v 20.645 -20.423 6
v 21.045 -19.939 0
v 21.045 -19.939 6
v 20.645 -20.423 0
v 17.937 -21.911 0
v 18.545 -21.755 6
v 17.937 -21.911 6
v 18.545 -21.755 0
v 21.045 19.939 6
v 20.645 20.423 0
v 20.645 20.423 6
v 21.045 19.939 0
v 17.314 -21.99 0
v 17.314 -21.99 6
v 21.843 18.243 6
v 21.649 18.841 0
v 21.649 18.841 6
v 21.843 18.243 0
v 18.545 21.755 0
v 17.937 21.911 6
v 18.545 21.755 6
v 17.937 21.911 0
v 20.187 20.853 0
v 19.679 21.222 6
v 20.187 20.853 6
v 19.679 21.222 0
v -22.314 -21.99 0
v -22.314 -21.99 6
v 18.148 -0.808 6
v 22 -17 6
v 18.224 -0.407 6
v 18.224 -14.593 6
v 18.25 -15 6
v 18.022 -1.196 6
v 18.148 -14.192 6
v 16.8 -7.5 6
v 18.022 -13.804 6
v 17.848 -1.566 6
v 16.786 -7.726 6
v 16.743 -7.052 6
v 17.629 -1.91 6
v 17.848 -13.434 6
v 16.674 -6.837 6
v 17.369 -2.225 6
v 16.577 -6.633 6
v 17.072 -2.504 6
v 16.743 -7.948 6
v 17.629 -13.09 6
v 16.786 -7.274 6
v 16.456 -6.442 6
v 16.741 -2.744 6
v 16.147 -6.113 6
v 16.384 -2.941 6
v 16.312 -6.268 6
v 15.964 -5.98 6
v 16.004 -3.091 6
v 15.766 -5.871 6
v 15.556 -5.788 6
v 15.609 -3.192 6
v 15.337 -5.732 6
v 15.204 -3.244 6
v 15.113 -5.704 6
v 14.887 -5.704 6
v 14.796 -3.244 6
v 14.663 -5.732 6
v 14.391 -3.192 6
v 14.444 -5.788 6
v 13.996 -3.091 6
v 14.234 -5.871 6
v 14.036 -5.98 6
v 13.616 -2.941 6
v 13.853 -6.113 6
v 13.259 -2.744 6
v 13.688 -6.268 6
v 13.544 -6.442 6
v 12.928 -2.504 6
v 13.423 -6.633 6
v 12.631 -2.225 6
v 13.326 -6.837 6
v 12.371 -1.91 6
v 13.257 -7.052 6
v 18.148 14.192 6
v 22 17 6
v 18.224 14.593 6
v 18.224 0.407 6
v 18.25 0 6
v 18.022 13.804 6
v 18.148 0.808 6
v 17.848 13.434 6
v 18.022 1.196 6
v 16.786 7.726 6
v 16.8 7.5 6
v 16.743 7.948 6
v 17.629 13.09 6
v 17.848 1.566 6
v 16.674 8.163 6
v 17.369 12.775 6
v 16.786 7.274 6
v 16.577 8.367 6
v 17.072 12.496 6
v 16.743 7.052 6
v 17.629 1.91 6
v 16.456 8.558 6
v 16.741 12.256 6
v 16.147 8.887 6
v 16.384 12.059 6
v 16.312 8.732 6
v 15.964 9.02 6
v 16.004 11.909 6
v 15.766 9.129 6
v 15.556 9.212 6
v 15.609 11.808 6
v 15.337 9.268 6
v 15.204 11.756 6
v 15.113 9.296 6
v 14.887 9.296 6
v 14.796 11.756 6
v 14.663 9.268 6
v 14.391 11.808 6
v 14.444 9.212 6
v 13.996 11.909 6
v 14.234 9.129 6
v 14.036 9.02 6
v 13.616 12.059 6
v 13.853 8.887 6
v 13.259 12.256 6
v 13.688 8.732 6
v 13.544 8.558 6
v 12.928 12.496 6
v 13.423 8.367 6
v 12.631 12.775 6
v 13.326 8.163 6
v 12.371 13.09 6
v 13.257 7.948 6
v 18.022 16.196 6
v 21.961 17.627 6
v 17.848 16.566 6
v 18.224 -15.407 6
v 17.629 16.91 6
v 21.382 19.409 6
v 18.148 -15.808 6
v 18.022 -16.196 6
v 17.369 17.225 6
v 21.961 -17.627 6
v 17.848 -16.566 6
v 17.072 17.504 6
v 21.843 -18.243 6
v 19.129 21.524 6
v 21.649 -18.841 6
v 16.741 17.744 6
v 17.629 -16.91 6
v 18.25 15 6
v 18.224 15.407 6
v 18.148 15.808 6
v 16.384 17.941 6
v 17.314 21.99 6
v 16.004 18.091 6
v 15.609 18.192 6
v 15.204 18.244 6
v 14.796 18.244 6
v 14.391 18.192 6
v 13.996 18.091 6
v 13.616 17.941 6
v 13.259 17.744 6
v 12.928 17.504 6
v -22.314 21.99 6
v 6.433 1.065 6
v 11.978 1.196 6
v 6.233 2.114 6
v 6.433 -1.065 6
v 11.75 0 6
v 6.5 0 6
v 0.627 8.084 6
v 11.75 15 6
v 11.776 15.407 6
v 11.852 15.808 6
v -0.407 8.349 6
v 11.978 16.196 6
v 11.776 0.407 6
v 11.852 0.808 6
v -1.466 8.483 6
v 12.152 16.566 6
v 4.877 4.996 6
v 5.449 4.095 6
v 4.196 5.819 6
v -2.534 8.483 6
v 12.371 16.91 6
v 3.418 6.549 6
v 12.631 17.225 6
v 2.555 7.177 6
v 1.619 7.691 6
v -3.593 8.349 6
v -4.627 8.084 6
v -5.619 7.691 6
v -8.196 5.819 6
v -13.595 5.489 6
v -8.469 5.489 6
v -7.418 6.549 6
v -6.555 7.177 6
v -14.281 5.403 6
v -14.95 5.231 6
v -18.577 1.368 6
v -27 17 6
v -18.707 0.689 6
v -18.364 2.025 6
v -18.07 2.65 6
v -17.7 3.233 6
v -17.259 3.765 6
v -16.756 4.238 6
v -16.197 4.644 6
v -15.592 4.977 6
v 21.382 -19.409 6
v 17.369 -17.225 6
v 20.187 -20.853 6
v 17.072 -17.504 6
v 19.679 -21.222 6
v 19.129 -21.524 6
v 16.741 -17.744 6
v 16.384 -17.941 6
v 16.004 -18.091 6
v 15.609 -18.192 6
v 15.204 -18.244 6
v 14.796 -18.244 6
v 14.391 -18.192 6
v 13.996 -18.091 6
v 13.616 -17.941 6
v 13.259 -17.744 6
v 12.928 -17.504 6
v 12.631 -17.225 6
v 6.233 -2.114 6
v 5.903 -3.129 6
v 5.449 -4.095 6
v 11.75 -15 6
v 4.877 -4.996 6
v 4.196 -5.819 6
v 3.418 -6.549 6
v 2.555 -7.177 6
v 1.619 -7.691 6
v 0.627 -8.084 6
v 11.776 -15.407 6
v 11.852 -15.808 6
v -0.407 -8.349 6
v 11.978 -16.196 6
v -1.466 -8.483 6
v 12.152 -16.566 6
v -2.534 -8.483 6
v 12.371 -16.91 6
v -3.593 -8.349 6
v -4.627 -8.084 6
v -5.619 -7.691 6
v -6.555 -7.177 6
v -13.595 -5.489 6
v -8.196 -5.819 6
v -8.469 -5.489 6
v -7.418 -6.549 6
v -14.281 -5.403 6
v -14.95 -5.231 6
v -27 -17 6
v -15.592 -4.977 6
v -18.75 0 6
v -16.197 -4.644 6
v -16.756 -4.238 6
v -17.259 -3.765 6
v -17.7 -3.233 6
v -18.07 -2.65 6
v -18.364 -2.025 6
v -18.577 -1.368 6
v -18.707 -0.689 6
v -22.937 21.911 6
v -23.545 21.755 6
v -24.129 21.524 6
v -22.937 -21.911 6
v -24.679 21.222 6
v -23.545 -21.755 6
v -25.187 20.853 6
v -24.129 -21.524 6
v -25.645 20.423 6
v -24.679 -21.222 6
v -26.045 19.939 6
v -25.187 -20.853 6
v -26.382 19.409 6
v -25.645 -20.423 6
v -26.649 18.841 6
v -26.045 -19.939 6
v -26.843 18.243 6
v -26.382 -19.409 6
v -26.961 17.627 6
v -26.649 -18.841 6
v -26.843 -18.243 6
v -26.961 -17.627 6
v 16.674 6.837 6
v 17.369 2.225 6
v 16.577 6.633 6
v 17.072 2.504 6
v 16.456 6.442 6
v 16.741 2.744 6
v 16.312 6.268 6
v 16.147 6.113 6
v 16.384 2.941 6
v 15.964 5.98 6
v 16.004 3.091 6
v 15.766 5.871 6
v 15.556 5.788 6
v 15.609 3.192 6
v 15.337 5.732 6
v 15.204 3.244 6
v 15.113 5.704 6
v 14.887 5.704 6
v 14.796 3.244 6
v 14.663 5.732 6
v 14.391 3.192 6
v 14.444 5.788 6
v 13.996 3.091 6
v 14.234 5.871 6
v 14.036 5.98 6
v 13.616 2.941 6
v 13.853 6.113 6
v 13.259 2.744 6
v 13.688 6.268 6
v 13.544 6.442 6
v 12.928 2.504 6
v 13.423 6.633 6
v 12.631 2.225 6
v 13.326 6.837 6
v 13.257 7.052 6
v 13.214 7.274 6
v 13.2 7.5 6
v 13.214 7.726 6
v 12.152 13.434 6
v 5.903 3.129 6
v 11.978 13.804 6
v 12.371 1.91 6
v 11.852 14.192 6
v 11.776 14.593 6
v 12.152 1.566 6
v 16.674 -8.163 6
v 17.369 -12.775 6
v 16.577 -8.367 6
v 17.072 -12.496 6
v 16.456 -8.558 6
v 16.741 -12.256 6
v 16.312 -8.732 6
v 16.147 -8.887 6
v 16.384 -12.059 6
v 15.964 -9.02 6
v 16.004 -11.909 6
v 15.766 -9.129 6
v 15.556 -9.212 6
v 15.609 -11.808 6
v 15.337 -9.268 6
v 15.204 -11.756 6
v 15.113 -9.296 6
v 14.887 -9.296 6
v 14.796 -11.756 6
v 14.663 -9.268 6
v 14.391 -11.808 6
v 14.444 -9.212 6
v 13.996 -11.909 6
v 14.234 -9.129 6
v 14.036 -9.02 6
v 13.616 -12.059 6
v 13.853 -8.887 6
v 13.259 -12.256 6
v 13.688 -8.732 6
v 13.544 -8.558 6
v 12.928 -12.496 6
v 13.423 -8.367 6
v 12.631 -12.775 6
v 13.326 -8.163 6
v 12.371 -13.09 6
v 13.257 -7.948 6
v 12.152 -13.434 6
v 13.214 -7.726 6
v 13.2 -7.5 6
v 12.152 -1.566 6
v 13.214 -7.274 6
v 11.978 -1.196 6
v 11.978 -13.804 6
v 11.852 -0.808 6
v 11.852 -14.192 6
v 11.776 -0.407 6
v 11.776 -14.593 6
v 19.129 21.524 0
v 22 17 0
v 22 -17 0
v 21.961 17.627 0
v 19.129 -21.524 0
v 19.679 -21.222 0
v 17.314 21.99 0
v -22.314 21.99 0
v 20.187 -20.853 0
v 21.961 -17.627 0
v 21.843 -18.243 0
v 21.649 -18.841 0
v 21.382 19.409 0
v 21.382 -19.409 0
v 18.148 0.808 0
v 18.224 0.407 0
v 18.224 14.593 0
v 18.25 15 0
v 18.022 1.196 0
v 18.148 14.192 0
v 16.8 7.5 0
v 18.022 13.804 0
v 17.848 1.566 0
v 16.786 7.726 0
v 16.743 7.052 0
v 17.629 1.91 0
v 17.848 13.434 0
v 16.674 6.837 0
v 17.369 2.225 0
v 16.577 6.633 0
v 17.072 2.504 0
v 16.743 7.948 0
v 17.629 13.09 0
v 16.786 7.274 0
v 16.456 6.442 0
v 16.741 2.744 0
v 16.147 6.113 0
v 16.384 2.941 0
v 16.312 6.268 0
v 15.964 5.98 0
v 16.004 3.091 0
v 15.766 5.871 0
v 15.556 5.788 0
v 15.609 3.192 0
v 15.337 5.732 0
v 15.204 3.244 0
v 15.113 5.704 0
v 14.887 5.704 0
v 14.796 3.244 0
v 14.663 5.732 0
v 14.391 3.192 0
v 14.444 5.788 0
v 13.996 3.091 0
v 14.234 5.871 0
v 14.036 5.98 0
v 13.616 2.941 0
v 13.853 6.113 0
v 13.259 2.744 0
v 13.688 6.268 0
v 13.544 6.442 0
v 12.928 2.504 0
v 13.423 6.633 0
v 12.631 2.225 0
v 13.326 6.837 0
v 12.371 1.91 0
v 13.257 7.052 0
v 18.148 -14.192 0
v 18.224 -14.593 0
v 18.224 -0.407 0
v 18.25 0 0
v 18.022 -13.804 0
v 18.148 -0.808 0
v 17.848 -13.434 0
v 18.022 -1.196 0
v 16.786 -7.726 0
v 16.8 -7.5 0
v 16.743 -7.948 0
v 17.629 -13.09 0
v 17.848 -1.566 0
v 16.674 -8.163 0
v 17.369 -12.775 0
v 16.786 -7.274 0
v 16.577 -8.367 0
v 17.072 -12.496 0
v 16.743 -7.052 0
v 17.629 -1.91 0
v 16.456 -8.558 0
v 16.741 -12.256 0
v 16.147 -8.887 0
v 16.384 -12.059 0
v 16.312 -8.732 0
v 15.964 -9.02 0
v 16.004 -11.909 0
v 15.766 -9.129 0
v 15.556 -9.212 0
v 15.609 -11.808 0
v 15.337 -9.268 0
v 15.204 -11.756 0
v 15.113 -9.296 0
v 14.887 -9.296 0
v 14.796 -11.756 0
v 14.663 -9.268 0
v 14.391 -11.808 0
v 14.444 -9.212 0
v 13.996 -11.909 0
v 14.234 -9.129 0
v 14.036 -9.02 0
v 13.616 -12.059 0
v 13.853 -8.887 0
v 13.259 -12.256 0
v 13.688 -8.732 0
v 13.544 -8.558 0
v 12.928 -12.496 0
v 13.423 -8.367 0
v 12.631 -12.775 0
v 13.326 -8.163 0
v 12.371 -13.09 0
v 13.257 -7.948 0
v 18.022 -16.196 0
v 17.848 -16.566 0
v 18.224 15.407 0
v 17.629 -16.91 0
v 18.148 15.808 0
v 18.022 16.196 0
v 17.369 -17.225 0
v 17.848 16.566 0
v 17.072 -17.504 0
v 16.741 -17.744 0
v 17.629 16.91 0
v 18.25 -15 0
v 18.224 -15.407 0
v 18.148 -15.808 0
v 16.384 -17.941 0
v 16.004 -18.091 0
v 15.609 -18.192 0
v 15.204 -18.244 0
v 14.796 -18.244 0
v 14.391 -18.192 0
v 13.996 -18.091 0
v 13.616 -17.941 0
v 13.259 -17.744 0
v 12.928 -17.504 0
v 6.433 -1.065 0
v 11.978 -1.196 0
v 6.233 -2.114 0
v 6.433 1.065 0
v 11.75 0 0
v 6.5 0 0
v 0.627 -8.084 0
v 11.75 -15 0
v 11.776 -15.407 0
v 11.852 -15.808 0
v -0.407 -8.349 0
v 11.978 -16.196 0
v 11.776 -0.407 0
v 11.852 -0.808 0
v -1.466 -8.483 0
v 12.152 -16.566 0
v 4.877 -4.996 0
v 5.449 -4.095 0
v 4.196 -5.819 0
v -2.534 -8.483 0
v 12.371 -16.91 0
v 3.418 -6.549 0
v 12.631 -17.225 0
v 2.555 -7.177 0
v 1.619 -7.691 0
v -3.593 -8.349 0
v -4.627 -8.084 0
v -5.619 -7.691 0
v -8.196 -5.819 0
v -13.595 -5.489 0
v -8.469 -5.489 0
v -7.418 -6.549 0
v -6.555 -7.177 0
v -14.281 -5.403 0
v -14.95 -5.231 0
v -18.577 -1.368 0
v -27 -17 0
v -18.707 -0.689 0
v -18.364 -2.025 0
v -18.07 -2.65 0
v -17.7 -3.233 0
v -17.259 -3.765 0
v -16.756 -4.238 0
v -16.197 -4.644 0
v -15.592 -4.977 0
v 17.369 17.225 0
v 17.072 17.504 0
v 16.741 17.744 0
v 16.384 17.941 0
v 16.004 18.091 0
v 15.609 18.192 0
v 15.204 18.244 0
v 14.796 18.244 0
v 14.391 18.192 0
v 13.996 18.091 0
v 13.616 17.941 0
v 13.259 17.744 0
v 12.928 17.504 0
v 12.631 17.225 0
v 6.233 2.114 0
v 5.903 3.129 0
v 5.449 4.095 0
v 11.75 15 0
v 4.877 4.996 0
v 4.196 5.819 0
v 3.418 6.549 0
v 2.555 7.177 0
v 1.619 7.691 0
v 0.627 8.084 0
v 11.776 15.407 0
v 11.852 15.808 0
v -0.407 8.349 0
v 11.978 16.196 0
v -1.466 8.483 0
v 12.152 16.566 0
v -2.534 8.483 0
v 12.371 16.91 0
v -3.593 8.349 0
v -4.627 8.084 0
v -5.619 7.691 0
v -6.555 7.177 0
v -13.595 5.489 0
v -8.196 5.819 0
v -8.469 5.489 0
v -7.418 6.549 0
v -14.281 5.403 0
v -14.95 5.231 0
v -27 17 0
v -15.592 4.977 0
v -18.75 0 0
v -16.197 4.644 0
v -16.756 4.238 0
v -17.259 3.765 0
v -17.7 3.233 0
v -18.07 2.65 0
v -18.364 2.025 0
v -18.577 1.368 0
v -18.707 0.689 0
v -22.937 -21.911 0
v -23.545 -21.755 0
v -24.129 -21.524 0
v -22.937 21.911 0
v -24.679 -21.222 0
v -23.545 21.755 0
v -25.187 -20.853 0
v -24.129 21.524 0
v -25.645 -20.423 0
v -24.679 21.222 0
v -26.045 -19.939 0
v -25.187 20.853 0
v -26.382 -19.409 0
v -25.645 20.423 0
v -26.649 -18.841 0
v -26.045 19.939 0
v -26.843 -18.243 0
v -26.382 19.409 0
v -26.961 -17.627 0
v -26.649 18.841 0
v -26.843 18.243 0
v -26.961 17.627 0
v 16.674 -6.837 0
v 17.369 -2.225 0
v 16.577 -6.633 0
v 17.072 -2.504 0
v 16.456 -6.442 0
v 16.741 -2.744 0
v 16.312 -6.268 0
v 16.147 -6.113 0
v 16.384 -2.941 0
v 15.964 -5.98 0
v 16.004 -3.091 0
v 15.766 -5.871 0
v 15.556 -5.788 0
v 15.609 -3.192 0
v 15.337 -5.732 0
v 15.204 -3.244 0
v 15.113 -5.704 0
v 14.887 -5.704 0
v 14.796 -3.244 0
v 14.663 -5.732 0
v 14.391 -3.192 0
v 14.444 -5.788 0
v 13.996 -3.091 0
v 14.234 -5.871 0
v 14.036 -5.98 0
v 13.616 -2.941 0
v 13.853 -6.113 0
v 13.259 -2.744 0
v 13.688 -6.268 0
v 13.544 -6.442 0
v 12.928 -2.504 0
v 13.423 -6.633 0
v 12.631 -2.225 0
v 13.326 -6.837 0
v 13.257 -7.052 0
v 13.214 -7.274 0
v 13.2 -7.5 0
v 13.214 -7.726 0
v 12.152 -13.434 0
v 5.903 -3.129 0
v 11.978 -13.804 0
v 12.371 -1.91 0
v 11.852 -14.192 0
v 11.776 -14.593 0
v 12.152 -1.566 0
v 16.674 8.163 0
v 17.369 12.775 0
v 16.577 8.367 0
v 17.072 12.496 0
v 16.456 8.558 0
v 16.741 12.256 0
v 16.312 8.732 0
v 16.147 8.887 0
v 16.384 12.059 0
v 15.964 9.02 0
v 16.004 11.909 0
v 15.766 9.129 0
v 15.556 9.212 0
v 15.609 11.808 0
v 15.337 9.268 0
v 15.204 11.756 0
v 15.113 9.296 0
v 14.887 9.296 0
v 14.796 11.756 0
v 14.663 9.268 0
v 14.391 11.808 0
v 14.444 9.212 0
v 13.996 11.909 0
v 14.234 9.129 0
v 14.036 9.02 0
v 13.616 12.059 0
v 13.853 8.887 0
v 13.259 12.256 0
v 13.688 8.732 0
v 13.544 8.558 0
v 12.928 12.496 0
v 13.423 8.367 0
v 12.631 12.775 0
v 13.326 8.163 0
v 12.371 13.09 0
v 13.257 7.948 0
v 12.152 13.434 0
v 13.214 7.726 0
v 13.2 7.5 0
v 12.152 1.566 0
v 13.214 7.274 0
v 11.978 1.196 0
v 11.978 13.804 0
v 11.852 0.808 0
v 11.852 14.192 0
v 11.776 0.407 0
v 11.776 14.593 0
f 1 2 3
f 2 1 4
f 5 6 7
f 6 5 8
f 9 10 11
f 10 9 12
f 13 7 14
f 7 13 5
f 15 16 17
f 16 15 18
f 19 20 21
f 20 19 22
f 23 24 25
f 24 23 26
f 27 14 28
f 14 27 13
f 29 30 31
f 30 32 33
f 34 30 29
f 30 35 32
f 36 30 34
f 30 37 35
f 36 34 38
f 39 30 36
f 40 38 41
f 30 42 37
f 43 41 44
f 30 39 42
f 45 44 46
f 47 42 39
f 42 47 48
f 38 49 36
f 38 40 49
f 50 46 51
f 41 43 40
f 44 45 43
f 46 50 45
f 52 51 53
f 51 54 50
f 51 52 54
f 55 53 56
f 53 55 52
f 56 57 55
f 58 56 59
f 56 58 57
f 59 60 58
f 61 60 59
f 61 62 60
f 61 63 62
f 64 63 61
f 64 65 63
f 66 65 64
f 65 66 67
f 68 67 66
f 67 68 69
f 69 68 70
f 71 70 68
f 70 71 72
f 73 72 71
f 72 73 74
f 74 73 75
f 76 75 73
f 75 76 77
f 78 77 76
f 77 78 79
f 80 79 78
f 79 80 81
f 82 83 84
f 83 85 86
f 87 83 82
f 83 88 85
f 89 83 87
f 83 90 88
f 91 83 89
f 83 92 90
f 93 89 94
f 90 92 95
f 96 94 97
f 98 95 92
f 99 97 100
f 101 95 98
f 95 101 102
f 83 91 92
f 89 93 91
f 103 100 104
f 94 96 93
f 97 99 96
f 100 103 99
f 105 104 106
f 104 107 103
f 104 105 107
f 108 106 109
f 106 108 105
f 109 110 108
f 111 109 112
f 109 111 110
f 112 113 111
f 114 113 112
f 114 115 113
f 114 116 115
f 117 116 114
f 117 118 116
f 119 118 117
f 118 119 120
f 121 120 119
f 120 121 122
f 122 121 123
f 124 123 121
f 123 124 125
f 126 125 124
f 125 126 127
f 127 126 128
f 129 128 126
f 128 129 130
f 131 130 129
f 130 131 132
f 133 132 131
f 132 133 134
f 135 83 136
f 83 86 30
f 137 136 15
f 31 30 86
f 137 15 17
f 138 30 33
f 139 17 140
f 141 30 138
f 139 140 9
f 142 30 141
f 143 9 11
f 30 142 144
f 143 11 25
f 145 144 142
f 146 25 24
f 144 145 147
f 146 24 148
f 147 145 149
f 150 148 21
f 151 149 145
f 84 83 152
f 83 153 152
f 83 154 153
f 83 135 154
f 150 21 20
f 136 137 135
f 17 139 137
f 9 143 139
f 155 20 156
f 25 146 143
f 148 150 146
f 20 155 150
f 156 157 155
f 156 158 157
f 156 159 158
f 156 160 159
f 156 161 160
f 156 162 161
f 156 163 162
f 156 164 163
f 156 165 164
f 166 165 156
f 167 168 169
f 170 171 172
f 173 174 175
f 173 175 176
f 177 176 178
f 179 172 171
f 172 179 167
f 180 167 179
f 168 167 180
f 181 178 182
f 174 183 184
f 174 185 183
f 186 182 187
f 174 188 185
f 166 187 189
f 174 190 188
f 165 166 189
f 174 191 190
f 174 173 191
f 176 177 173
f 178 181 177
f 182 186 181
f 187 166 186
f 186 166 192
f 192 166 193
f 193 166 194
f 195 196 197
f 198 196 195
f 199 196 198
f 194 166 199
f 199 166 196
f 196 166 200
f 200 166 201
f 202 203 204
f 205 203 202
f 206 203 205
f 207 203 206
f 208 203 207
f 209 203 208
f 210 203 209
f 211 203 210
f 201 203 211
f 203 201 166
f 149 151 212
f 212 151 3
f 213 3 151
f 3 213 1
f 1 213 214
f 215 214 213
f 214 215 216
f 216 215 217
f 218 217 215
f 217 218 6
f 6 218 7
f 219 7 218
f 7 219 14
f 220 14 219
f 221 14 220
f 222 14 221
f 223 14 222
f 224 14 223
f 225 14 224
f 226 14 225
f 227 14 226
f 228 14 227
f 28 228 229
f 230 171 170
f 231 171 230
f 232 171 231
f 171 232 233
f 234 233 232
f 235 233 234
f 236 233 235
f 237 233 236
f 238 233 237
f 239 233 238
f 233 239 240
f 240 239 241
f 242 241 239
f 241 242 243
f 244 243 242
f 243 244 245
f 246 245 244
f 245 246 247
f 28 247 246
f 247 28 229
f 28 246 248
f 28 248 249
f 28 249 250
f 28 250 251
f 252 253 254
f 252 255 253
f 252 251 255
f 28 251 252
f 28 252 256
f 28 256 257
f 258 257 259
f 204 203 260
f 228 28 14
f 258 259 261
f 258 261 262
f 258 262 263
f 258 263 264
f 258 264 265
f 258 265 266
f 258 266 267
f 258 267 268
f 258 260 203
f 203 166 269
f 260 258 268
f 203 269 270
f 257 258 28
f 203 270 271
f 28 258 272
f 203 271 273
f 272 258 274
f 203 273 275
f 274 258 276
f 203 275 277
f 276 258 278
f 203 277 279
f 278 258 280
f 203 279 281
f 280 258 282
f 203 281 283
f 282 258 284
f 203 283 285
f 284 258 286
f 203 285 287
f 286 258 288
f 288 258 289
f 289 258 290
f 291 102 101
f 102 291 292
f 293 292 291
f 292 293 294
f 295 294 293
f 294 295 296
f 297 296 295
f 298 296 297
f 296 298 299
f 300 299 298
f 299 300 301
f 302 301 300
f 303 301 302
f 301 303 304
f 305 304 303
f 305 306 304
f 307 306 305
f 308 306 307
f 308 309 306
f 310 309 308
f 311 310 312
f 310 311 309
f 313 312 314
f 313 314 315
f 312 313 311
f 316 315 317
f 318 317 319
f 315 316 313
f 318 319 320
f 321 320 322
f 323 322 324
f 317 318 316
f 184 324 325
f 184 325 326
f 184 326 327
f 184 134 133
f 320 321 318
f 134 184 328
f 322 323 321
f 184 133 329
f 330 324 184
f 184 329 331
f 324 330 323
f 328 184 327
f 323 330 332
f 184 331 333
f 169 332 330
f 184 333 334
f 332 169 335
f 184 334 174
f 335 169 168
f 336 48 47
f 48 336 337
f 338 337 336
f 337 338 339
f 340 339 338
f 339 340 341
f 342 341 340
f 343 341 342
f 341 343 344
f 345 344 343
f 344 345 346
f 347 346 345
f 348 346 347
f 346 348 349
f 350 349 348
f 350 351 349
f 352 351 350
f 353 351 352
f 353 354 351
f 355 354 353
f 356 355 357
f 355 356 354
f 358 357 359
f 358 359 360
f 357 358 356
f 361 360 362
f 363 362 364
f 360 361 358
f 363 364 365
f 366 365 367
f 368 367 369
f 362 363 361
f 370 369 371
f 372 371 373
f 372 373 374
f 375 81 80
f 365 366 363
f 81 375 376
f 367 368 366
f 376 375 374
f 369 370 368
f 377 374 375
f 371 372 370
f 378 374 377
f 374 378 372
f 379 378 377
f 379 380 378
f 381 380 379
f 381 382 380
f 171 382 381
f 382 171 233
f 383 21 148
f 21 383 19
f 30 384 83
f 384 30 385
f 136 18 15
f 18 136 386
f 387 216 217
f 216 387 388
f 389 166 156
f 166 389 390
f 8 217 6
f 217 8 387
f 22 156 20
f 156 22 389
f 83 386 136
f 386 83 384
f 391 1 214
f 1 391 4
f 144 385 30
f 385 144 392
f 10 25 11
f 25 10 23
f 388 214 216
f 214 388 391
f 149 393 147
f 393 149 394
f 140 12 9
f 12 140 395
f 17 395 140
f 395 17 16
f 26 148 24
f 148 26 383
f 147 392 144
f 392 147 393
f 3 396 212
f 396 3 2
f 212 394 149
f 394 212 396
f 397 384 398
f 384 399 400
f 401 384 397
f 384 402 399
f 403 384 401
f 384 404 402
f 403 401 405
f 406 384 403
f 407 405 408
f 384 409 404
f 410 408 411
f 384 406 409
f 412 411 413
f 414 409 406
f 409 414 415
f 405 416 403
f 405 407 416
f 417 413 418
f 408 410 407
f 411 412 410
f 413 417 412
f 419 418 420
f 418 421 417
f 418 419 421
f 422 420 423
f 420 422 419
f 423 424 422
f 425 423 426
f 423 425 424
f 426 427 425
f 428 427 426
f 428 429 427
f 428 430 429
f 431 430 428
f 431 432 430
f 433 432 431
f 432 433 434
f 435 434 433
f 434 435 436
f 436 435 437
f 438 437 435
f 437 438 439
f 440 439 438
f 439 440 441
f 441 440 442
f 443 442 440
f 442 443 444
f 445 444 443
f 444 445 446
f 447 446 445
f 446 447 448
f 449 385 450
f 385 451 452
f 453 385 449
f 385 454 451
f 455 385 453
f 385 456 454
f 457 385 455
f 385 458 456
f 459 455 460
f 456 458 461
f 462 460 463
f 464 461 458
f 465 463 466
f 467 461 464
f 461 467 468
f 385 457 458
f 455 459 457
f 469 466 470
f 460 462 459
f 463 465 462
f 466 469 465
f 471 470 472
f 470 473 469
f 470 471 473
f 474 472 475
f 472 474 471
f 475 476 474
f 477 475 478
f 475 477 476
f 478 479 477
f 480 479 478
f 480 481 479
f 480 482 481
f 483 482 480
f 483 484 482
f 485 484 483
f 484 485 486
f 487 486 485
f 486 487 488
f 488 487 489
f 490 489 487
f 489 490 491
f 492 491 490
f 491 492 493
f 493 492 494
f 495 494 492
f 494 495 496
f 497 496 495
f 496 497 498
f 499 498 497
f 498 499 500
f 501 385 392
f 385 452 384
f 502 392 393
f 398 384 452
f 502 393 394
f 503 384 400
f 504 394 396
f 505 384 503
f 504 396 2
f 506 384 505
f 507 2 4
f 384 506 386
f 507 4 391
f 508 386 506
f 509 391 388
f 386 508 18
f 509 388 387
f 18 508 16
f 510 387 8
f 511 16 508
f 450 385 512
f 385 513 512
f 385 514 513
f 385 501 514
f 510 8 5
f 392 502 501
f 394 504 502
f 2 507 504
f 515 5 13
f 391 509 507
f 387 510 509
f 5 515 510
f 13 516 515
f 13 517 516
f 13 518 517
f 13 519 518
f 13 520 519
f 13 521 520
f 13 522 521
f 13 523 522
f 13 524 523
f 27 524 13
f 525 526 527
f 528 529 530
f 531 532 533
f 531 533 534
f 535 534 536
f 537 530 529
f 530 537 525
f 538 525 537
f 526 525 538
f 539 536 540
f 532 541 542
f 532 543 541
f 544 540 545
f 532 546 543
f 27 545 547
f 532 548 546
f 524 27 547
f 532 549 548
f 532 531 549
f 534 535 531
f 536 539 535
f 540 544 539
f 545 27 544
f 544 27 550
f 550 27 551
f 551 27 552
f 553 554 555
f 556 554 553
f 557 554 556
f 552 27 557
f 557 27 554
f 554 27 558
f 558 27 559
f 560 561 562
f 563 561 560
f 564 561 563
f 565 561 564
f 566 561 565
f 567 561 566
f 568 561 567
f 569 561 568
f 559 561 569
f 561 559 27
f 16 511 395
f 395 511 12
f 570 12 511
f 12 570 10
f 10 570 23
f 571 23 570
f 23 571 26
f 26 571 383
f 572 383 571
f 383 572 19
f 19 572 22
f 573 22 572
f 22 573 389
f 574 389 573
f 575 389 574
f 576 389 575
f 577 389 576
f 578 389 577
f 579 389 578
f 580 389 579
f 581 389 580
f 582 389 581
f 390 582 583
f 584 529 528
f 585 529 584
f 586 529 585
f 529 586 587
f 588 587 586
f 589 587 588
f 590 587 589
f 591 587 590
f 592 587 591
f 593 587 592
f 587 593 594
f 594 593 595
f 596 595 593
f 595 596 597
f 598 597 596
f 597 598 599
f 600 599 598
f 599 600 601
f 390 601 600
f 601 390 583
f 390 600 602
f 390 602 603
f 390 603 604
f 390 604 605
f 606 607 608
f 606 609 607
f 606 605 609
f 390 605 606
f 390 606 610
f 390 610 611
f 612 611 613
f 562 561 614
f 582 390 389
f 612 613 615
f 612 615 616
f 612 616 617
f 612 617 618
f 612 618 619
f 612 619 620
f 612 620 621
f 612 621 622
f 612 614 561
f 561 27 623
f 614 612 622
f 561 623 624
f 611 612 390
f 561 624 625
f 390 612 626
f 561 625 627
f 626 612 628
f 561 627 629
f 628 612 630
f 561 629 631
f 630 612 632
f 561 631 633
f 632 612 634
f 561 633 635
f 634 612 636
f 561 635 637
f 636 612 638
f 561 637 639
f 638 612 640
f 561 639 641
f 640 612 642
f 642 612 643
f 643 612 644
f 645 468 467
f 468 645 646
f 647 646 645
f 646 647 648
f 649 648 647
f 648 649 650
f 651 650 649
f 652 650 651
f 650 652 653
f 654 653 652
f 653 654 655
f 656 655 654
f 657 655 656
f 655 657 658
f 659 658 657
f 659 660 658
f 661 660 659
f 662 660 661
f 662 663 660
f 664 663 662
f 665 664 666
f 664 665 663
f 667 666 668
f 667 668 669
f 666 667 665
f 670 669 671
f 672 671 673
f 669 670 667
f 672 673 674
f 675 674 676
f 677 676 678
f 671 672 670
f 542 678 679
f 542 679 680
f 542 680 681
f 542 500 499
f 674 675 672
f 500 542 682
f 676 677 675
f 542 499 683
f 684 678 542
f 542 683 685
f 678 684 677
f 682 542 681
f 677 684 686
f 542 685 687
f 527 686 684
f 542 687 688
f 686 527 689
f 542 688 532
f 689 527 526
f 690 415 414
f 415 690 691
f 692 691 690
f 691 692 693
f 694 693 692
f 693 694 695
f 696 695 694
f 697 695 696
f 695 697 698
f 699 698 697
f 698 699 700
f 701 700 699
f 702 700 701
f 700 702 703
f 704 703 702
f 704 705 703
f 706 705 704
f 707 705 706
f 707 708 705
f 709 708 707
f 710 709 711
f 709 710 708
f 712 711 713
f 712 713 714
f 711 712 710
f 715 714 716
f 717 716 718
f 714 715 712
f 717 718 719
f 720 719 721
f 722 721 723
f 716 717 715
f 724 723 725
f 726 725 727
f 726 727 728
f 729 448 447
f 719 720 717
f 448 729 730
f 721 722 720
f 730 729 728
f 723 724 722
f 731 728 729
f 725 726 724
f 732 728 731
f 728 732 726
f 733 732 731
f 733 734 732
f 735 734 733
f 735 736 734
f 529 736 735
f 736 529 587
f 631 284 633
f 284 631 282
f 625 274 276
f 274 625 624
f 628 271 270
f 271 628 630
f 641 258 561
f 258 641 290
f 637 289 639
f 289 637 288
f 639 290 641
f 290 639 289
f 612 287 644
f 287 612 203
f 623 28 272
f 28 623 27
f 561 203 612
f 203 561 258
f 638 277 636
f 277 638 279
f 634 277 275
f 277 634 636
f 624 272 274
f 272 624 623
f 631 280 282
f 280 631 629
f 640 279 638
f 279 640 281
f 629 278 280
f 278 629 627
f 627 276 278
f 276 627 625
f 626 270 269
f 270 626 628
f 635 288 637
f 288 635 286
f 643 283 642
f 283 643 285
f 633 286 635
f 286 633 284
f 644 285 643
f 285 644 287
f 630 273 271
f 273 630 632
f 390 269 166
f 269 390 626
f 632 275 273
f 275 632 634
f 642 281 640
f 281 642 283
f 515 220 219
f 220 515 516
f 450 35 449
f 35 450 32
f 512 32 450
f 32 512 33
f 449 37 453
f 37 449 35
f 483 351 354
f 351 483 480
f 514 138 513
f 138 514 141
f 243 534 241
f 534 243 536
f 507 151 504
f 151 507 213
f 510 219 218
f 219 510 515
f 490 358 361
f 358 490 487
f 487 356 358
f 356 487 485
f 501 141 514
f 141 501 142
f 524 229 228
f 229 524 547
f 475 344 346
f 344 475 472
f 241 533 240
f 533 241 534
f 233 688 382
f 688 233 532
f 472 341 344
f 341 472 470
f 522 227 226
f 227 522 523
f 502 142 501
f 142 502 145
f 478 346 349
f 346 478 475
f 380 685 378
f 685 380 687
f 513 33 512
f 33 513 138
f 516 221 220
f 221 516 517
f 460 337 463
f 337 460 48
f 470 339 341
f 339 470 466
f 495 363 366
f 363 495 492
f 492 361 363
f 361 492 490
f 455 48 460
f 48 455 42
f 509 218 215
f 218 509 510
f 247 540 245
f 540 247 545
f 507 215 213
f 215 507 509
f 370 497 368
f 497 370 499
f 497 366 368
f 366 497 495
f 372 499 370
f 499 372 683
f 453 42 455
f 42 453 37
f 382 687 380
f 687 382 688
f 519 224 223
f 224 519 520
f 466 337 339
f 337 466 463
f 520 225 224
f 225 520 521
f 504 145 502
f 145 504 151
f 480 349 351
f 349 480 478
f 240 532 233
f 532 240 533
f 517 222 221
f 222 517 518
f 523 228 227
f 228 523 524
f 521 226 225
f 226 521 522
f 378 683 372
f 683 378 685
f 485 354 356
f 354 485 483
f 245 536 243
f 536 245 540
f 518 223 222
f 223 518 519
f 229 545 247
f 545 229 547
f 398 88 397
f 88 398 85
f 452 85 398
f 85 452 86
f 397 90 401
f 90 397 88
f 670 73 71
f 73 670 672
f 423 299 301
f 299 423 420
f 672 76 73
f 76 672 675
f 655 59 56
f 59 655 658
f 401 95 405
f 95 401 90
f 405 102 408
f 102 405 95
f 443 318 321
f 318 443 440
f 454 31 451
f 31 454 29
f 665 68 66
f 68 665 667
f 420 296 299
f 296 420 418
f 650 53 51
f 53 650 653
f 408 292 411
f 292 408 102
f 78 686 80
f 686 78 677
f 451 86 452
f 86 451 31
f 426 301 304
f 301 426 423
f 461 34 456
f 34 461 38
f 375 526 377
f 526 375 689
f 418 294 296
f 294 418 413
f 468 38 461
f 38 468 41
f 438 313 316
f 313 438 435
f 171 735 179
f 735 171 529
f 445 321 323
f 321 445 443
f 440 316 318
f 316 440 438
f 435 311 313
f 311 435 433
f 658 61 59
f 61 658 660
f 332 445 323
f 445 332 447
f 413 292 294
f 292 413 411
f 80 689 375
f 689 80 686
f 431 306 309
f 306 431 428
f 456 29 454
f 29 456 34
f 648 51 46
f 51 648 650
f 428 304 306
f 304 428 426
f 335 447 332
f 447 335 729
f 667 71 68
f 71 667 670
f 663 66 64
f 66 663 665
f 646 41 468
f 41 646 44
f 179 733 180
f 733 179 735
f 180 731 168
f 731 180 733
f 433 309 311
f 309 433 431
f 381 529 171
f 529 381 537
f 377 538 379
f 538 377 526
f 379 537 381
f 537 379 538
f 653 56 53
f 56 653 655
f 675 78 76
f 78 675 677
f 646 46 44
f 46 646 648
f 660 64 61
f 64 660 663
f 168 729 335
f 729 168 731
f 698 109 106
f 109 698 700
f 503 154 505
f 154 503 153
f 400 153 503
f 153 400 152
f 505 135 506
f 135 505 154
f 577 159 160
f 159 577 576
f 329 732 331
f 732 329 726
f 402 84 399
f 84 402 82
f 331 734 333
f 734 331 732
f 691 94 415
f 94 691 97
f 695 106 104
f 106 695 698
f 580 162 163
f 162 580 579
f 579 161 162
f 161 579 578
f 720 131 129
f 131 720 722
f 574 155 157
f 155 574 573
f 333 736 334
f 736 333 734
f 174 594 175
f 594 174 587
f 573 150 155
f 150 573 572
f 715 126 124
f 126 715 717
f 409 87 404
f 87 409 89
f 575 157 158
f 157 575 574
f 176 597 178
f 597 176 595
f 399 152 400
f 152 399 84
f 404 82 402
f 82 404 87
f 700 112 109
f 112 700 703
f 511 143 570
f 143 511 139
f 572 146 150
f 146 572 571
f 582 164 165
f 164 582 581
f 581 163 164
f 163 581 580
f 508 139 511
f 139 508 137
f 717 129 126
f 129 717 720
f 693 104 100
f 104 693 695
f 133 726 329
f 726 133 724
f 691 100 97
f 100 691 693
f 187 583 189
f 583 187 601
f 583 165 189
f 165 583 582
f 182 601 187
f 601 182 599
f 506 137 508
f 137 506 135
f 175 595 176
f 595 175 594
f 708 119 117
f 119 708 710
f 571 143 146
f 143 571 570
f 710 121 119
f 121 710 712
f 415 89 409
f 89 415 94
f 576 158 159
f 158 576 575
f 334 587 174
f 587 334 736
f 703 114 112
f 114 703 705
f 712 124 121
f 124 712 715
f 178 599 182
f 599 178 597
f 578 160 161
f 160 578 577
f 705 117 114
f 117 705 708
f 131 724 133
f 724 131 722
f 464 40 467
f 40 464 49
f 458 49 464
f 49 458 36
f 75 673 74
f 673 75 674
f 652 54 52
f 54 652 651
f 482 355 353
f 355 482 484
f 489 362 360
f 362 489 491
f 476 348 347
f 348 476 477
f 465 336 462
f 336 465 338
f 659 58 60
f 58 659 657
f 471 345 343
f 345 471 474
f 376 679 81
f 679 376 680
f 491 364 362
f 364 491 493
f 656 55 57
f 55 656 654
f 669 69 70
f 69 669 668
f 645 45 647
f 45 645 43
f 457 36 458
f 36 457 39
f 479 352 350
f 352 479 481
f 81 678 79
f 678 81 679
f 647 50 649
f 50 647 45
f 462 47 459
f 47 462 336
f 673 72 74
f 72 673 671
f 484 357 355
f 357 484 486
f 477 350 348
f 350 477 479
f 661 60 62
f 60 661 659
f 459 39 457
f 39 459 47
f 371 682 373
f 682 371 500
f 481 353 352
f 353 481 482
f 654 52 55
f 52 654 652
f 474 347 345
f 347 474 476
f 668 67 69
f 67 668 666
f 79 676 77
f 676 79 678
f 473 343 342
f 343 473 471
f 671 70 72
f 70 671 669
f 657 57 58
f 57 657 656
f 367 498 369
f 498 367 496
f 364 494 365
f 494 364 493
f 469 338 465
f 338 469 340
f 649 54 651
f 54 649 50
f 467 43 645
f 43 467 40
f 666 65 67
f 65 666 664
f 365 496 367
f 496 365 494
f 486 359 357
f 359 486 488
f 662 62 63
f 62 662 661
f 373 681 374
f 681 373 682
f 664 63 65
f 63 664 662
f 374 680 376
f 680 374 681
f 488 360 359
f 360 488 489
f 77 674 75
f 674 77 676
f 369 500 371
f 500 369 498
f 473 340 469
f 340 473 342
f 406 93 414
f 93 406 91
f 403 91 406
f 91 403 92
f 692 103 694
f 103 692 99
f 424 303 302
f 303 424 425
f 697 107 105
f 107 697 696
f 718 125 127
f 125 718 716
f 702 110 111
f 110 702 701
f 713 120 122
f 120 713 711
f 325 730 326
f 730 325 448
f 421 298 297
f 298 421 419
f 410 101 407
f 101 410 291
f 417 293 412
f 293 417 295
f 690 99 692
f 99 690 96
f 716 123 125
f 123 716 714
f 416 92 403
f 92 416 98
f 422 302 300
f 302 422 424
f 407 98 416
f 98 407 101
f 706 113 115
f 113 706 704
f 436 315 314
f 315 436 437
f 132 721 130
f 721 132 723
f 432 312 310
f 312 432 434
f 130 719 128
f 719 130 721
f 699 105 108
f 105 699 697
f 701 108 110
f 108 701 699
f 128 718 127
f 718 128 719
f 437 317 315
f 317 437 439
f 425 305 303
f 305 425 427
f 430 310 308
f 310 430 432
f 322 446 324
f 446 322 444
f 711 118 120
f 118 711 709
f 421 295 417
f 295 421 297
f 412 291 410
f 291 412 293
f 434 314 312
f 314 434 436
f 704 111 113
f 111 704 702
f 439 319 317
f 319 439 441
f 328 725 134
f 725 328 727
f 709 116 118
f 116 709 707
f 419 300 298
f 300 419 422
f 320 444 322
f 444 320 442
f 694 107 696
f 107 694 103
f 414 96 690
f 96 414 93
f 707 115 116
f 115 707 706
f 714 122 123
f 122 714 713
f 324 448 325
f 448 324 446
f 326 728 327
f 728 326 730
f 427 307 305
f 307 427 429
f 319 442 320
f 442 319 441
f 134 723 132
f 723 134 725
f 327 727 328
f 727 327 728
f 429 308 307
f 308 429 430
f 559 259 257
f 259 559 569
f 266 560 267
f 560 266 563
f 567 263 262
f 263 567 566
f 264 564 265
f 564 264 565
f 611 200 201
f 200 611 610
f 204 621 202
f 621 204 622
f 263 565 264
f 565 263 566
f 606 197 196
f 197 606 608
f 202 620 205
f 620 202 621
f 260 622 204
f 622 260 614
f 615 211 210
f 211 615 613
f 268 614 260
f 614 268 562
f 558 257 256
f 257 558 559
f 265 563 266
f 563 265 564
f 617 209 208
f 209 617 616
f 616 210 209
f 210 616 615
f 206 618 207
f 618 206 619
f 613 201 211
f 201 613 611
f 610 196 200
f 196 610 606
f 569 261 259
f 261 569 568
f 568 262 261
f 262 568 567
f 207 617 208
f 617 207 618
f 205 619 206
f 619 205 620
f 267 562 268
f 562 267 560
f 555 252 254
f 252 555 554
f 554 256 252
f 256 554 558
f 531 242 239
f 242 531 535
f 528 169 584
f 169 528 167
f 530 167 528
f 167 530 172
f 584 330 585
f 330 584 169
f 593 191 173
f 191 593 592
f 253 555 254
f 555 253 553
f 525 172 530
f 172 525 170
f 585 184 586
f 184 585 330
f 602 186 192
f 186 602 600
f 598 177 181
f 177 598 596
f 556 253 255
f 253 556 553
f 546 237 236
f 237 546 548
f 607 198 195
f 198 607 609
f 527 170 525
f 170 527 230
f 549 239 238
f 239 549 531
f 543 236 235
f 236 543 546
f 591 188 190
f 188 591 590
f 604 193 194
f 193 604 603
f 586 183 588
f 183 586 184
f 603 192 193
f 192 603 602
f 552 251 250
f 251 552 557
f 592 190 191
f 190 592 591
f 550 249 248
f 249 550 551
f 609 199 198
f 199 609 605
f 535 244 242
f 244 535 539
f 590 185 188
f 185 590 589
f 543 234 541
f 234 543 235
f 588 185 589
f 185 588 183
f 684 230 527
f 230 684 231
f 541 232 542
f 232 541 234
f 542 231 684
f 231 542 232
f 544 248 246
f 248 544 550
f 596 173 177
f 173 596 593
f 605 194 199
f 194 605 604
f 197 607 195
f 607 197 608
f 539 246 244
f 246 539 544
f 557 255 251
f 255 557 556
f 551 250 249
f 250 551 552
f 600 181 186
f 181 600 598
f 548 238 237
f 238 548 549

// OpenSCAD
$fn = 50;


difference() {
	union() {
		hull() {
			translate(v = [-17.0000000000, 17.0000000000, 0]) {
				cylinder(h = 6, r = 5);
			}
			translate(v = [17.0000000000, 17.0000000000, 0]) {
				cylinder(h = 6, r = 5);
			}
			translate(v = [-17.0000000000, -17.0000000000, 0]) {
				cylinder(h = 6, r = 5);
			}
			translate(v = [17.0000000000, -17.0000000000, 0]) {
				cylinder(h = 6, r = 5);
			}
		}
		translate(v = [-5.0000000000, 0, 0]) {
			hull() {
				translate(v = [-17.0000000000, 17.0000000000, 0]) {
					cylinder(h = 6, r = 5);
				}
				translate(v = [17.0000000000, 17.0000000000, 0]) {
					cylinder(h = 6, r = 5);
				}
				translate(v = [-17.0000000000, -17.0000000000, 0]) {
					cylinder(h = 6, r = 5);
				}
				translate(v = [17.0000000000, -17.0000000000, 0]) {
					cylinder(h = 6, r = 5);
				}
			}
		}
	}
	union() {
		translate(v = [15.0000000000, -15.0000000000, 0]) {
			cylinder(h = 6, r = 3.2500000000);
		}
		translate(v = [15.0000000000, 0.0000000000, 0]) {
			cylinder(h = 6, r = 3.2500000000);
		}
		translate(v = [15.0000000000, 15.0000000000, 0]) {
			cylinder(h = 6, r = 3.2500000000);
		}
		translate(v = [15.0000000000, -15.0000000000, 0]) {
			cylinder(h = 6, r = 1.8000000000);
		}
		translate(v = [15.0000000000, -7.5000000000, 0]) {
			cylinder(h = 6, r = 1.8000000000);
		}
		translate(v = [15.0000000000, 0.0000000000, 0]) {
			cylinder(h = 6, r = 1.8000000000);
		}
		translate(v = [15.0000000000, 7.5000000000, 0]) {
			cylinder(h = 6, r = 1.8000000000);
		}
		translate(v = [15.0000000000, 15.0000000000, 0]) {
			cylinder(h = 6, r = 1.8000000000);
		}
		translate(v = [15.0000000000, -15.0000000000, 0]) {
			cylinder(h = 6, r = 1.8000000000);
		}
		translate(v = [15.0000000000, -7.5000000000, 0]) {
			cylinder(h = 6, r = 1.8000000000);
		}
		translate(v = [15.0000000000, 0.0000000000, 0]) {
			cylinder(h = 6, r = 1.8000000000);
		}
		translate(v = [15.0000000000, 7.5000000000, 0]) {
			cylinder(h = 6, r = 1.8000000000);
		}
		translate(v = [15.0000000000, 15.0000000000, 0]) {
			cylinder(h = 6, r = 1.8000000000);
		}
		translate(v = [15.0000000000, -15.0000000000, 0]) {
			cylinder(h = 6, r = 1.8000000000);
		}
		translate(v = [15.0000000000, -7.5000000000, 0]) {
			cylinder(h = 6, r = 1.8000000000);
		}
		translate(v = [15.0000000000, 0.0000000000, 0]) {
			cylinder(h = 6, r = 1.8000000000);
		}
		translate(v = [15.0000000000, 7.5000000000, 0]) {
			cylinder(h = 6, r = 1.8000000000);
		}
		translate(v = [15.0000000000, 15.0000000000, 0]) {
			cylinder(h = 6, r = 1.8000000000);
		}
		translate(v = [-9.5000000000, 0, 0]) {
			hull() {
				translate(v = [-3.7500000000, 0.0000000000, 0]) {
					cylinder(h = 6, r = 5.5000000000);
				}
				translate(v = [3.7500000000, 0.0000000000, 0]) {
					cylinder(h = 6, r = 5.5000000000);
				}
				translate(v = [-3.7500000000, -0.0000000000, 0]) {
					cylinder(h = 6, r = 5.5000000000);
				}
				translate(v = [3.7500000000, -0.0000000000, 0]) {
					cylinder(h = 6, r = 5.5000000000);
				}
			}
		}
		translate(v = [-2.0000000000, 0, 0.0000000000]) {
			cylinder(h = 6, r = 8.5000000000);
		}
	}
}
